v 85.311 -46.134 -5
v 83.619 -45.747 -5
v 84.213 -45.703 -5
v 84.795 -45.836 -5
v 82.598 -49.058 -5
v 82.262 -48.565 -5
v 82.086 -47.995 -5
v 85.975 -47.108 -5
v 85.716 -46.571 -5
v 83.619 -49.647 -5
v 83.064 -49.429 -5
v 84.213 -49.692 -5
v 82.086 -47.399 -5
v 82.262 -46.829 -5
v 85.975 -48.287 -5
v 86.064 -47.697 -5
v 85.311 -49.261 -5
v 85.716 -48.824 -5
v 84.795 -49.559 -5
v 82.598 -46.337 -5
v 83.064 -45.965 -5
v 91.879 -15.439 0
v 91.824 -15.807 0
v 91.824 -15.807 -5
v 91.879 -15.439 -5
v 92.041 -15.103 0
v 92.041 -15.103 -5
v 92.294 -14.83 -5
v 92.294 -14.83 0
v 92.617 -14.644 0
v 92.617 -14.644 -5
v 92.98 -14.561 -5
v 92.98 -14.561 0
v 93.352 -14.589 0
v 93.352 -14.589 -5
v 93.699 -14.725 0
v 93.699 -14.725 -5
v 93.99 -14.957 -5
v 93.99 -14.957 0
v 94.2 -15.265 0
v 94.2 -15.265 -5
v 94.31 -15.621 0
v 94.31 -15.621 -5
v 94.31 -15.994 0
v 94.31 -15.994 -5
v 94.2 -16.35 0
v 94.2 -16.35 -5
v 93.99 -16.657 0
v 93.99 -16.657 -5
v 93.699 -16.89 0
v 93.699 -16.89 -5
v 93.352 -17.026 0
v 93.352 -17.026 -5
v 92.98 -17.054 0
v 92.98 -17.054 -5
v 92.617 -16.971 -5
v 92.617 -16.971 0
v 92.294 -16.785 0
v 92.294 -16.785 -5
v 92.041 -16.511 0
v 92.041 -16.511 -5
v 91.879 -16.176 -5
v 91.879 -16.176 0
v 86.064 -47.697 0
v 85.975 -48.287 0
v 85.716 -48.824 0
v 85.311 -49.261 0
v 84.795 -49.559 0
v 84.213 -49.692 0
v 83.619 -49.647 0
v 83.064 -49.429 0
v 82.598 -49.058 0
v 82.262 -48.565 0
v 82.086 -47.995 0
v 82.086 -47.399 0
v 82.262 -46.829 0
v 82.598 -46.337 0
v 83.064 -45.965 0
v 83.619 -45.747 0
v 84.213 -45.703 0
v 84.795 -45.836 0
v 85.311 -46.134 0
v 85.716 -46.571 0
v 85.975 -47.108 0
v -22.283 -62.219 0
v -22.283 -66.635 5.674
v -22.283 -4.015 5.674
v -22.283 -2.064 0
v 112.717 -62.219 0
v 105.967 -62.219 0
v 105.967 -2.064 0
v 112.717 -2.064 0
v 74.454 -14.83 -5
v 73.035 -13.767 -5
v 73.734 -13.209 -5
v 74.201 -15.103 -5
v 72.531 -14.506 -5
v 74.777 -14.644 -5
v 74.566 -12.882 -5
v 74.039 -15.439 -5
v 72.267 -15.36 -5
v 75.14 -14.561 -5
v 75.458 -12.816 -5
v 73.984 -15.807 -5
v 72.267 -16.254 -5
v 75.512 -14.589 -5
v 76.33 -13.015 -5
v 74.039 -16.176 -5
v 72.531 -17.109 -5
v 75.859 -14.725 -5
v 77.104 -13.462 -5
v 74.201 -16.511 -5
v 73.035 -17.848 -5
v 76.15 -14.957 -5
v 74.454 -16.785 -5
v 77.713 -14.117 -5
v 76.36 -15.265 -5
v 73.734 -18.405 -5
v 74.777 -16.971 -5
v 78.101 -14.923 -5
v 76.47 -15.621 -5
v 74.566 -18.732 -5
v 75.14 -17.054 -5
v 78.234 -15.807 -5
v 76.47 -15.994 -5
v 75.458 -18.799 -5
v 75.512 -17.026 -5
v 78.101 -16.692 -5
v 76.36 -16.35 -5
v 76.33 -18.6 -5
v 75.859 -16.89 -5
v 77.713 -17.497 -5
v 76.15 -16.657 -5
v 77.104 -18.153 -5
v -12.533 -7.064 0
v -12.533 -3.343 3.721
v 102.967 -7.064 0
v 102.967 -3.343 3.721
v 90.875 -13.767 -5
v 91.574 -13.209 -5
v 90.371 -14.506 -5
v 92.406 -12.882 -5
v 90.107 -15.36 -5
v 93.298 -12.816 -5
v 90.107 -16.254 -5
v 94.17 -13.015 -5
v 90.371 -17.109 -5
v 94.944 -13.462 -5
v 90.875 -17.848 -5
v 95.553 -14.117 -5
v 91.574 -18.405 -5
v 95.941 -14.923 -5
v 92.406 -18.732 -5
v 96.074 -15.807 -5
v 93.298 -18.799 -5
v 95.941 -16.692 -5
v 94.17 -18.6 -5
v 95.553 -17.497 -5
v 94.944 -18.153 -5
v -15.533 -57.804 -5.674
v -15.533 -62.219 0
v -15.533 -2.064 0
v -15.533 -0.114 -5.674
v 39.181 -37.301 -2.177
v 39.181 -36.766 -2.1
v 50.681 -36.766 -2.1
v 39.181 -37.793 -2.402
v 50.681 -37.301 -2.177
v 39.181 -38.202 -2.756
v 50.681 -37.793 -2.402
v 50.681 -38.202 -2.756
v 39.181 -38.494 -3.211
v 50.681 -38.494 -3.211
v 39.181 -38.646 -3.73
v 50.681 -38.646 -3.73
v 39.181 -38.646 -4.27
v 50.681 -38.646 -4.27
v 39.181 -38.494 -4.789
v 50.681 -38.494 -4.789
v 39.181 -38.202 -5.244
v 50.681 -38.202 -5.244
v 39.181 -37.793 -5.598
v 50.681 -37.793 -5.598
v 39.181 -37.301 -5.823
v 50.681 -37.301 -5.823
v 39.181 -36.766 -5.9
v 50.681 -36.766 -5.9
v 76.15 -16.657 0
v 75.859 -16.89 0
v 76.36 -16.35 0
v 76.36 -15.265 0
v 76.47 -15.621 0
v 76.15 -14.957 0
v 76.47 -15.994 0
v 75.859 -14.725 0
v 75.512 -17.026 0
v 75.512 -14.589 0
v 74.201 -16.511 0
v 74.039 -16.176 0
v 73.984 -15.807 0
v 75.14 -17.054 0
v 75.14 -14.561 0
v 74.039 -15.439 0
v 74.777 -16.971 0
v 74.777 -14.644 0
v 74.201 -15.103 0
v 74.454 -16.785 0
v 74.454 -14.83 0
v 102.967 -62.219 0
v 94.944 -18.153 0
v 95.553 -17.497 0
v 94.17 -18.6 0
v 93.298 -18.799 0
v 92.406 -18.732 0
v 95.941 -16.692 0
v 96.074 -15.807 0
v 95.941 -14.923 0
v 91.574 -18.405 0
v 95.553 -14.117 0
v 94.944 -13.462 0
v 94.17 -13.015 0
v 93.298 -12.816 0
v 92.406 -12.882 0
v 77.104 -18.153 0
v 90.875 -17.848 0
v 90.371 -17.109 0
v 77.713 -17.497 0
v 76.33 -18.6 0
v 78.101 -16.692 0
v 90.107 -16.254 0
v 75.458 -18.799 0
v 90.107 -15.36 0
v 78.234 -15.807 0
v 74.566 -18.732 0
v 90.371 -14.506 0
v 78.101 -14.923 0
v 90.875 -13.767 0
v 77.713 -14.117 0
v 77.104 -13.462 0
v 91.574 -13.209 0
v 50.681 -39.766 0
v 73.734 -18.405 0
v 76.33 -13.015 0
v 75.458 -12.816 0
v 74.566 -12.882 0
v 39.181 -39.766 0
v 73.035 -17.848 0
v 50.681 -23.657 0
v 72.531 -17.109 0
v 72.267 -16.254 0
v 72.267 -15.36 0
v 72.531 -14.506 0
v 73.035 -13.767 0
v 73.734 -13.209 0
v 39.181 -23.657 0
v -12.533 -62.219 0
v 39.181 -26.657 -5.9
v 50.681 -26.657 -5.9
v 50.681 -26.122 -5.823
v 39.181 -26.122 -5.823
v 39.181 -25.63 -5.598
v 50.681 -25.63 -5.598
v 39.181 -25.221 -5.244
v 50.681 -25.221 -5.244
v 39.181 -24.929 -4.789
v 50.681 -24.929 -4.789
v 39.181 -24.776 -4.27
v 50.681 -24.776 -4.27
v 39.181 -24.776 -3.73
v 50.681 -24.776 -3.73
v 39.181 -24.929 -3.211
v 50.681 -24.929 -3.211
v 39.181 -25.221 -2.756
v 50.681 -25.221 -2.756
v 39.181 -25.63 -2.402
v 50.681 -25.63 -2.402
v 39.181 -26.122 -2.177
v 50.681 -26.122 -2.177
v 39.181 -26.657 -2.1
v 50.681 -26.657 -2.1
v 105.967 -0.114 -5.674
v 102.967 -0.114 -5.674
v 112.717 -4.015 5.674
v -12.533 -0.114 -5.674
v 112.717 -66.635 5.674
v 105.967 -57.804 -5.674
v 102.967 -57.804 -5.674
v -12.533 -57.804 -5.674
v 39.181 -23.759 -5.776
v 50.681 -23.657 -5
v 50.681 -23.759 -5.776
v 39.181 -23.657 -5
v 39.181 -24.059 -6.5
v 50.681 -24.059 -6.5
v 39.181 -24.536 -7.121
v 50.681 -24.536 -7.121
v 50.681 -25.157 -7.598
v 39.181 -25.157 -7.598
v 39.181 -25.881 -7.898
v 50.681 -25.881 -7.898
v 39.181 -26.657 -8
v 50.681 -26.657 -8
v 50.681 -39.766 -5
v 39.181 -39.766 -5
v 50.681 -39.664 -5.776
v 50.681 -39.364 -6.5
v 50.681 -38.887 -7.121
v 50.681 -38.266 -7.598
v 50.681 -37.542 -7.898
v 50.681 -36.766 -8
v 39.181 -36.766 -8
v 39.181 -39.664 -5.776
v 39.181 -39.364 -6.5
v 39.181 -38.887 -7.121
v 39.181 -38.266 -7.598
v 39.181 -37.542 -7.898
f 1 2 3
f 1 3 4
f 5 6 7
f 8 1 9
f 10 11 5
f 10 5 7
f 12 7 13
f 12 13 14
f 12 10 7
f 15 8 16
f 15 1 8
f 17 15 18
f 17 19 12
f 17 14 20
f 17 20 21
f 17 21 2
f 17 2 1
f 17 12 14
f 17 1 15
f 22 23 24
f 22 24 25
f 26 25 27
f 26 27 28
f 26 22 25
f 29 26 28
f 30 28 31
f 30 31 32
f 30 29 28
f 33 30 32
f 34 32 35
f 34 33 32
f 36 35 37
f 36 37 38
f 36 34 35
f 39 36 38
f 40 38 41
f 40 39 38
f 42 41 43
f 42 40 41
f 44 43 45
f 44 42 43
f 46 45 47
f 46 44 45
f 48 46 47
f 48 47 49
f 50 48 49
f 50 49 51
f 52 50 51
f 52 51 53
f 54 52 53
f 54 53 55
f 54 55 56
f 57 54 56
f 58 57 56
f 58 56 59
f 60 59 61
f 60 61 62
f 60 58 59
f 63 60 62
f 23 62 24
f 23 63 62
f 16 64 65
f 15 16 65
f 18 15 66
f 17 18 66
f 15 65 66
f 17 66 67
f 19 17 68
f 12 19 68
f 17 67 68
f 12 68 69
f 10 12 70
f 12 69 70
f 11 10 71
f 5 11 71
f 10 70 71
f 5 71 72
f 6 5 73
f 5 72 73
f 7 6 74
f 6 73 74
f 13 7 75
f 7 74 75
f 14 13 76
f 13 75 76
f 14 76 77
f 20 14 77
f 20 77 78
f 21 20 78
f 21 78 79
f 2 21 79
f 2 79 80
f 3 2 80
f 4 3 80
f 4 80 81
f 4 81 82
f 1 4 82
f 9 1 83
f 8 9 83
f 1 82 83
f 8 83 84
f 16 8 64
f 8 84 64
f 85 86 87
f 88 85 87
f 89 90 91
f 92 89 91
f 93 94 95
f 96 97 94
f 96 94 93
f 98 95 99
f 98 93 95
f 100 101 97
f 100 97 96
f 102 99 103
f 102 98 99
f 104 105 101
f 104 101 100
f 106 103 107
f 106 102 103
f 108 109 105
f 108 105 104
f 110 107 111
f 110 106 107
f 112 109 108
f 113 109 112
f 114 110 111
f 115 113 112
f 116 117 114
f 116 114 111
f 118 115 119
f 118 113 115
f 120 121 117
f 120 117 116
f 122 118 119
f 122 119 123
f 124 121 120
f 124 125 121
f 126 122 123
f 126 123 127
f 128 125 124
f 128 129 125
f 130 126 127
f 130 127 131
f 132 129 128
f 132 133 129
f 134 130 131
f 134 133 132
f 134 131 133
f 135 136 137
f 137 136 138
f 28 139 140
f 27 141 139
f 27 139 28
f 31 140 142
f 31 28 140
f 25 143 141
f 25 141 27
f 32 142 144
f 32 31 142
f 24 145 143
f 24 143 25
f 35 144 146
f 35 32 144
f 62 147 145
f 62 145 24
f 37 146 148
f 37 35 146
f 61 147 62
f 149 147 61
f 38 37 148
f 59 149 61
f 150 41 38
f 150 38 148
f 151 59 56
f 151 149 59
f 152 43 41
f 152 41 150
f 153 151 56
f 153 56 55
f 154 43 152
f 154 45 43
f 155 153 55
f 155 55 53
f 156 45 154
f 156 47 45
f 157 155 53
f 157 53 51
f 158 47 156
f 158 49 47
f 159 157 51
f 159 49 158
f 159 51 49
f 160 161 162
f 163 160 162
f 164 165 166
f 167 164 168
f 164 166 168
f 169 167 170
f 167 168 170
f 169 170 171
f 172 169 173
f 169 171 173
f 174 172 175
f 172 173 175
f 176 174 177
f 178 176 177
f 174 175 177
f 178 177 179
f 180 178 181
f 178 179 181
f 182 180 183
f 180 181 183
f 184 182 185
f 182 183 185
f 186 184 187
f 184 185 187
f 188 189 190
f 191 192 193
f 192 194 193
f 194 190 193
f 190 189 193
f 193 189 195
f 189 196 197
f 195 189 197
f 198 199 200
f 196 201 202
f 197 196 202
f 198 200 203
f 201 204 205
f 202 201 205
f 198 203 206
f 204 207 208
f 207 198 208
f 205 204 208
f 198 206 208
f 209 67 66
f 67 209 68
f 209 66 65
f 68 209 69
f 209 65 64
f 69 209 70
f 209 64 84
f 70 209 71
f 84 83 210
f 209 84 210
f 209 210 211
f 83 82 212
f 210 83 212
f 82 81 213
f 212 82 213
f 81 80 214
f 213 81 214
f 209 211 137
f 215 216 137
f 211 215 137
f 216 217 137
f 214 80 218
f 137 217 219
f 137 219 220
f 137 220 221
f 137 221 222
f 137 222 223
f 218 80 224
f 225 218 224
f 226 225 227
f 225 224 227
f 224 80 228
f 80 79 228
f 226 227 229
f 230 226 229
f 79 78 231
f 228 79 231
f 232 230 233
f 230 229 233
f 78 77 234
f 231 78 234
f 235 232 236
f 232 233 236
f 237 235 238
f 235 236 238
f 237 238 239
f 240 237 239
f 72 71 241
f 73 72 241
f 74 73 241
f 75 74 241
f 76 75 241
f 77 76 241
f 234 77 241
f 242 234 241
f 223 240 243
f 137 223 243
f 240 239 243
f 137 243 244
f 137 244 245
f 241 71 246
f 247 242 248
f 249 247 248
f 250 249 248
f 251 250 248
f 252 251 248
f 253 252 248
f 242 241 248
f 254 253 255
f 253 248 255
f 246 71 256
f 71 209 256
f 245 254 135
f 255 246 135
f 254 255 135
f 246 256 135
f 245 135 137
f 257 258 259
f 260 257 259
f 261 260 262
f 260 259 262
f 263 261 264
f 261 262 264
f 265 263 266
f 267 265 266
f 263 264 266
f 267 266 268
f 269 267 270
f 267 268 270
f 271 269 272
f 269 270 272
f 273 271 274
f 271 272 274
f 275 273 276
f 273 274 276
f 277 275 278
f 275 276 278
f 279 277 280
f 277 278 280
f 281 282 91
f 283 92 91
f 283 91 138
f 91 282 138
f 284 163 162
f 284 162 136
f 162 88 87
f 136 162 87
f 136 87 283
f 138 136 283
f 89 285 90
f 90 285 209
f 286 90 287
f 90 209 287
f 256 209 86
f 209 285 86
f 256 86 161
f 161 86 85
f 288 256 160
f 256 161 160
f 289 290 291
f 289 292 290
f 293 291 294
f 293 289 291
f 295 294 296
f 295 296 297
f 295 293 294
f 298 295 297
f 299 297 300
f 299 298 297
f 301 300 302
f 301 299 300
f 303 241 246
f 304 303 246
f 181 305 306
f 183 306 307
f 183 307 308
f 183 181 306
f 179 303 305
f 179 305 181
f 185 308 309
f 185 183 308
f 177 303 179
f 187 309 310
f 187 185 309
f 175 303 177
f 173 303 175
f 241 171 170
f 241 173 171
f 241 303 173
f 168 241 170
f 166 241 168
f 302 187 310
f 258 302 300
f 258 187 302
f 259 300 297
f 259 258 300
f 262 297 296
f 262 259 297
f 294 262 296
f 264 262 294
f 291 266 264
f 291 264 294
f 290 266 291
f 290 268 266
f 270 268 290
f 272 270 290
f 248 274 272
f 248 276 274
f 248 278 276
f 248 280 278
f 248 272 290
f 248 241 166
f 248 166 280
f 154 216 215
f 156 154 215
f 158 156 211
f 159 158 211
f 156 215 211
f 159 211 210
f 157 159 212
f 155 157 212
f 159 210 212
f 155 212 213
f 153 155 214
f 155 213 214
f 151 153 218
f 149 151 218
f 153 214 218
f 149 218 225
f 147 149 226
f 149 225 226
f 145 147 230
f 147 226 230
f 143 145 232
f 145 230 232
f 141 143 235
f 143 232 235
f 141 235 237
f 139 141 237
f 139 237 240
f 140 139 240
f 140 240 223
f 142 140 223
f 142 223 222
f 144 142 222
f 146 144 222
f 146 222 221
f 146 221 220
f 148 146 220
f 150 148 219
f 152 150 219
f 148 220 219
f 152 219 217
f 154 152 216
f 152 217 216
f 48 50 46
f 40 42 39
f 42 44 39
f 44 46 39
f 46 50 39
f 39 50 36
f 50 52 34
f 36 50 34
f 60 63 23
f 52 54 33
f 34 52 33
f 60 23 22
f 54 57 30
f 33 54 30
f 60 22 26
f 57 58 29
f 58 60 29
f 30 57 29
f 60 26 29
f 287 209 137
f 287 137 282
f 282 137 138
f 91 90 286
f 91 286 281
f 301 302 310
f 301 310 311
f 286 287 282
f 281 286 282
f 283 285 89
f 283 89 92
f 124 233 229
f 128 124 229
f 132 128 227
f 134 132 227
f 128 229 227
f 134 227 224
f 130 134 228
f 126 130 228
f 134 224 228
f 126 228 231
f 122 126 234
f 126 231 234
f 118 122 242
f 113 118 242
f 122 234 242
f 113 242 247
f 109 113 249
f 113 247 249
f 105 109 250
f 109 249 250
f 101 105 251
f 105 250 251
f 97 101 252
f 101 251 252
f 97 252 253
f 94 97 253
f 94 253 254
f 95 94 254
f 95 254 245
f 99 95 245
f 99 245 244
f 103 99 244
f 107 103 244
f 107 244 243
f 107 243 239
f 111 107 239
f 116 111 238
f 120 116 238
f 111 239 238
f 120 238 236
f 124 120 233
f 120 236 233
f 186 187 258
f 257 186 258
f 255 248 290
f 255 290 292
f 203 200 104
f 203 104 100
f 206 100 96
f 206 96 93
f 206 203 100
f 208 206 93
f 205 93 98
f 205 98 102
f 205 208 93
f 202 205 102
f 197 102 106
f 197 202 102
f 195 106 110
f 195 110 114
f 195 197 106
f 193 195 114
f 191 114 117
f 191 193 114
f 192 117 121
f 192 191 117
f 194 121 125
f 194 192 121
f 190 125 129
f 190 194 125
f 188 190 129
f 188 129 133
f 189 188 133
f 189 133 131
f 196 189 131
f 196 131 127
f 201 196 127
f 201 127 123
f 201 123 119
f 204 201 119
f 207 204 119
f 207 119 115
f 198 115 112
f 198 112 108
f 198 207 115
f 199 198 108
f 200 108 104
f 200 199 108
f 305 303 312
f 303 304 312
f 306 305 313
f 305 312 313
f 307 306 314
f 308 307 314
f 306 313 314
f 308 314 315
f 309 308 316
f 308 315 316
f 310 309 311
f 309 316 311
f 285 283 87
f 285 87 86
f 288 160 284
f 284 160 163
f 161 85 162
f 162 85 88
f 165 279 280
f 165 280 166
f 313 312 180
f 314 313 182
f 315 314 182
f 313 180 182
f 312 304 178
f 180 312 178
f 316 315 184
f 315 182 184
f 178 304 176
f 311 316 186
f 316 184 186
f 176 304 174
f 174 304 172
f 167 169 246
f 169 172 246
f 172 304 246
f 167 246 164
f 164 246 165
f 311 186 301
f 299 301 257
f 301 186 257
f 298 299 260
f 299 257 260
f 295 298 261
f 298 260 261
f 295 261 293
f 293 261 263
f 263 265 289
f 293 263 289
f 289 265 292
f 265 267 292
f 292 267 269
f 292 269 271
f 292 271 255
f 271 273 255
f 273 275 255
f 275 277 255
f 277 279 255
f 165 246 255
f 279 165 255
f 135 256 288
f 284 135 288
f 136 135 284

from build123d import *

# Parameters (mm, degrees)
SALIENTE_EXTRUIR1_START    = -22.283463782
SALIENTE_EXTRUIR1_DEPTH    = 135
SALIENTE_EXTRUIR2_START    = -15.533463782
SALIENTE_EXTRUIR2_DEPTH    = 121.5
SALIENTE_EXTRUIR2_2_DEPTH  = 3
SALIENTE_EXTRUIR2_START_2  = 102.966536218
SALIENTE_EXTRUIR2_3_DEPTH  = 3
CORTAR_EXTRUIR1_DEPTH      = 10
CORTAR_EXTRUIR1_DEPTH_BACK = 148
CHAFL_N1_SIZE              = 5
CHAFL_N1_SIZE2             = 3.934668741
CROQUIS5_W                 = 11.5
CROQUIS5_H                 = 16.108624933
SALIENTE_EXTRUIR3_DEPTH    = 8
CORTAR_EXTRUIR2_DEPTH      = 14.8
REDONDEO1_R                = 3
CROQUIS7_R                 = 2
CROQUIS7_R_2               = 3
CROQUIS7_R_3               = 1.25
SALIENTE_EXTRUIR4_DEPTH    = 5


# Read off the part's stored shape, not the designer's step: Saliente-Extruir1, Saliente-Extruir2
with BuildPart() as part:
    # Saliente-Extruir1 outline → Saliente-Extruir1 (new body)
    with BuildSketch(Plane.YZ.offset(SALIENTE_EXTRUIR1_START)):
        Polygon((-75.458190571, 5.674155302), (-73.507815836, 0), (-2.064199728, 0), (-4.014574463, 5.674155302), align=None)
    extrude(amount=SALIENTE_EXTRUIR1_DEPTH)

    # Saliente-Extruir2 outline → Saliente-Extruir2 (add)
    with BuildSketch(Plane.YZ.offset(SALIENTE_EXTRUIR2_START)):
        Polygon((-63.757815836, 0), (-66.757815836, 0), (-64.807441101, -5.674155302), (-61.807441101, -5.674155302), align=None)
    extrude(amount=SALIENTE_EXTRUIR2_DEPTH)

    # Saliente-Extruir2 2 outline → Saliente-Extruir2 2 (add)
    with BuildSketch(Plane.YZ.offset(SALIENTE_EXTRUIR2_START)):
        Polygon((-2.064199728, 0), (-63.757815836, 0), (-61.807441101, -5.674155302), (-0.113824993, -5.674155302), align=None)
    extrude(amount=SALIENTE_EXTRUIR2_2_DEPTH)

    # Saliente-Extruir2 3 outline → Saliente-Extruir2 3 (add)
    with BuildSketch(Plane.YZ.offset(SALIENTE_EXTRUIR2_START_2)):
        Polygon((-2.064199728, 0), (-63.757815836, 0), (-61.807441101, -5.674155302), (-0.113824993, -5.674155302), align=None)
    extrude(amount=SALIENTE_EXTRUIR2_3_DEPTH)

    # Croquis3 → Cortar-Extruir1 (cut, two sides: drawn at the far end of the back side and taken through both)
    with BuildSketch(Plane(origin=(105.966536218, 0, 0), x_dir=(0, 0, -1), z_dir=(1, 0, 0)).offset(-CORTAR_EXTRUIR1_DEPTH_BACK)):
        Polygon((137.63492959, 43.681305963), (7.625291737, -57.488760722), (7.625291737, -67.23888859), (-5.407688567, -80.271868893), (-9.341803419, -77.990953795), (-7.87522913, -69.550856699), (-8.264975448, -68.650724899), (138.464177577, 45.530026939), align=None)
    extrude(amount=CORTAR_EXTRUIR1_DEPTH + CORTAR_EXTRUIR1_DEPTH_BACK, mode=Mode.SUBTRACT)

    # Chaflán1
    chafl_n1_edges = [part.edges().sort_by_distance(p)[0] for p in [
        (45.216536218, -2.064199728, 0),
    ]]
    chafl_n1_side = [part.faces().sort_by_distance(p)[0] for p in [
        (45.216536218, -32.141669504, 0),
    ]]
    chamfer(chafl_n1_edges, length=CHAFL_N1_SIZE, length2=CHAFL_N1_SIZE2, reference=chafl_n1_side[0])

    # Croquis5 → Saliente-Extruir3 (add)
    with BuildSketch(Plane(origin=(0, 0, 0), x_dir=(-1, 0, 0), z_dir=(0, 0, -1))):
        with Locations((-44.930876317, -31.711417234)):
            Rectangle(CROQUIS5_W, CROQUIS5_H)
    extrude(amount=SALIENTE_EXTRUIR3_DEPTH)

    # Croquis6 → Cortar-Extruir2 (cut)
    with BuildSketch(Plane(origin=(50.680876317, 0, 0), x_dir=(0, 0, -1), z_dir=(1, 0, 0))):
        with BuildLine():
            Line((5.9, -36.7657297), (5.9, -26.657104767))
            ThreePointArc((5.9, -26.657104767), (4, -24.757104767), (2.1, -26.657104767))
            Line((2.1, -26.657104767), (2.1, -36.7657297))
            ThreePointArc((2.1, -36.7657297), (4, -38.6657297), (5.9, -36.7657297))
        make_face()
    extrude(amount=-CORTAR_EXTRUIR2_DEPTH, mode=Mode.SUBTRACT)

    # Redondeo1
    redondeo1_edges = [part.edges().sort_by_distance(p)[0] for p in [
        (44.930876317, -23.657104767, -8),
        (44.930876317, -39.7657297, -8),
    ]]
    fillet(redondeo1_edges, radius=REDONDEO1_R)

    # Croquis7 → Saliente-Extruir4 (add)
    # profile 1 of 3: a face of its own
    with BuildSketch(Plane(origin=(0, 0, 0), x_dir=(-1, 0, 0), z_dir=(0, 0, -1))):
        with Locations(Location((-84.06385674, -47.697252062, 0), (0, 0, 180))):
            Circle(CROQUIS7_R)
    # profile 2 of 3: a face of its own
    with BuildSketch(Plane(origin=(0, 0, 0), x_dir=(-1, 0, 0), z_dir=(0, 0, -1))):
        with Locations(Location((-93.07385674, -15.807252062, 0), (0, 0, 180))):
            Circle(CROQUIS7_R_2)
        with Locations((-93.07385674, -15.807252062)):
            Circle(CROQUIS7_R_3, mode=Mode.SUBTRACT)
    # profile 3 of 3: a face of its own
    with BuildSketch(Plane(origin=(0, 0, 0), x_dir=(-1, 0, 0), z_dir=(0, 0, -1))):
        with Locations(Location((-75.23385674, -15.807252062, 0), (0, 0, 180))):
            Circle(CROQUIS7_R_2)
        with Locations((-75.23385674, -15.807252062)):
            Circle(CROQUIS7_R_3, mode=Mode.SUBTRACT)
    extrude(amount=SALIENTE_EXTRUIR4_DEPTH)


solid = part.part
